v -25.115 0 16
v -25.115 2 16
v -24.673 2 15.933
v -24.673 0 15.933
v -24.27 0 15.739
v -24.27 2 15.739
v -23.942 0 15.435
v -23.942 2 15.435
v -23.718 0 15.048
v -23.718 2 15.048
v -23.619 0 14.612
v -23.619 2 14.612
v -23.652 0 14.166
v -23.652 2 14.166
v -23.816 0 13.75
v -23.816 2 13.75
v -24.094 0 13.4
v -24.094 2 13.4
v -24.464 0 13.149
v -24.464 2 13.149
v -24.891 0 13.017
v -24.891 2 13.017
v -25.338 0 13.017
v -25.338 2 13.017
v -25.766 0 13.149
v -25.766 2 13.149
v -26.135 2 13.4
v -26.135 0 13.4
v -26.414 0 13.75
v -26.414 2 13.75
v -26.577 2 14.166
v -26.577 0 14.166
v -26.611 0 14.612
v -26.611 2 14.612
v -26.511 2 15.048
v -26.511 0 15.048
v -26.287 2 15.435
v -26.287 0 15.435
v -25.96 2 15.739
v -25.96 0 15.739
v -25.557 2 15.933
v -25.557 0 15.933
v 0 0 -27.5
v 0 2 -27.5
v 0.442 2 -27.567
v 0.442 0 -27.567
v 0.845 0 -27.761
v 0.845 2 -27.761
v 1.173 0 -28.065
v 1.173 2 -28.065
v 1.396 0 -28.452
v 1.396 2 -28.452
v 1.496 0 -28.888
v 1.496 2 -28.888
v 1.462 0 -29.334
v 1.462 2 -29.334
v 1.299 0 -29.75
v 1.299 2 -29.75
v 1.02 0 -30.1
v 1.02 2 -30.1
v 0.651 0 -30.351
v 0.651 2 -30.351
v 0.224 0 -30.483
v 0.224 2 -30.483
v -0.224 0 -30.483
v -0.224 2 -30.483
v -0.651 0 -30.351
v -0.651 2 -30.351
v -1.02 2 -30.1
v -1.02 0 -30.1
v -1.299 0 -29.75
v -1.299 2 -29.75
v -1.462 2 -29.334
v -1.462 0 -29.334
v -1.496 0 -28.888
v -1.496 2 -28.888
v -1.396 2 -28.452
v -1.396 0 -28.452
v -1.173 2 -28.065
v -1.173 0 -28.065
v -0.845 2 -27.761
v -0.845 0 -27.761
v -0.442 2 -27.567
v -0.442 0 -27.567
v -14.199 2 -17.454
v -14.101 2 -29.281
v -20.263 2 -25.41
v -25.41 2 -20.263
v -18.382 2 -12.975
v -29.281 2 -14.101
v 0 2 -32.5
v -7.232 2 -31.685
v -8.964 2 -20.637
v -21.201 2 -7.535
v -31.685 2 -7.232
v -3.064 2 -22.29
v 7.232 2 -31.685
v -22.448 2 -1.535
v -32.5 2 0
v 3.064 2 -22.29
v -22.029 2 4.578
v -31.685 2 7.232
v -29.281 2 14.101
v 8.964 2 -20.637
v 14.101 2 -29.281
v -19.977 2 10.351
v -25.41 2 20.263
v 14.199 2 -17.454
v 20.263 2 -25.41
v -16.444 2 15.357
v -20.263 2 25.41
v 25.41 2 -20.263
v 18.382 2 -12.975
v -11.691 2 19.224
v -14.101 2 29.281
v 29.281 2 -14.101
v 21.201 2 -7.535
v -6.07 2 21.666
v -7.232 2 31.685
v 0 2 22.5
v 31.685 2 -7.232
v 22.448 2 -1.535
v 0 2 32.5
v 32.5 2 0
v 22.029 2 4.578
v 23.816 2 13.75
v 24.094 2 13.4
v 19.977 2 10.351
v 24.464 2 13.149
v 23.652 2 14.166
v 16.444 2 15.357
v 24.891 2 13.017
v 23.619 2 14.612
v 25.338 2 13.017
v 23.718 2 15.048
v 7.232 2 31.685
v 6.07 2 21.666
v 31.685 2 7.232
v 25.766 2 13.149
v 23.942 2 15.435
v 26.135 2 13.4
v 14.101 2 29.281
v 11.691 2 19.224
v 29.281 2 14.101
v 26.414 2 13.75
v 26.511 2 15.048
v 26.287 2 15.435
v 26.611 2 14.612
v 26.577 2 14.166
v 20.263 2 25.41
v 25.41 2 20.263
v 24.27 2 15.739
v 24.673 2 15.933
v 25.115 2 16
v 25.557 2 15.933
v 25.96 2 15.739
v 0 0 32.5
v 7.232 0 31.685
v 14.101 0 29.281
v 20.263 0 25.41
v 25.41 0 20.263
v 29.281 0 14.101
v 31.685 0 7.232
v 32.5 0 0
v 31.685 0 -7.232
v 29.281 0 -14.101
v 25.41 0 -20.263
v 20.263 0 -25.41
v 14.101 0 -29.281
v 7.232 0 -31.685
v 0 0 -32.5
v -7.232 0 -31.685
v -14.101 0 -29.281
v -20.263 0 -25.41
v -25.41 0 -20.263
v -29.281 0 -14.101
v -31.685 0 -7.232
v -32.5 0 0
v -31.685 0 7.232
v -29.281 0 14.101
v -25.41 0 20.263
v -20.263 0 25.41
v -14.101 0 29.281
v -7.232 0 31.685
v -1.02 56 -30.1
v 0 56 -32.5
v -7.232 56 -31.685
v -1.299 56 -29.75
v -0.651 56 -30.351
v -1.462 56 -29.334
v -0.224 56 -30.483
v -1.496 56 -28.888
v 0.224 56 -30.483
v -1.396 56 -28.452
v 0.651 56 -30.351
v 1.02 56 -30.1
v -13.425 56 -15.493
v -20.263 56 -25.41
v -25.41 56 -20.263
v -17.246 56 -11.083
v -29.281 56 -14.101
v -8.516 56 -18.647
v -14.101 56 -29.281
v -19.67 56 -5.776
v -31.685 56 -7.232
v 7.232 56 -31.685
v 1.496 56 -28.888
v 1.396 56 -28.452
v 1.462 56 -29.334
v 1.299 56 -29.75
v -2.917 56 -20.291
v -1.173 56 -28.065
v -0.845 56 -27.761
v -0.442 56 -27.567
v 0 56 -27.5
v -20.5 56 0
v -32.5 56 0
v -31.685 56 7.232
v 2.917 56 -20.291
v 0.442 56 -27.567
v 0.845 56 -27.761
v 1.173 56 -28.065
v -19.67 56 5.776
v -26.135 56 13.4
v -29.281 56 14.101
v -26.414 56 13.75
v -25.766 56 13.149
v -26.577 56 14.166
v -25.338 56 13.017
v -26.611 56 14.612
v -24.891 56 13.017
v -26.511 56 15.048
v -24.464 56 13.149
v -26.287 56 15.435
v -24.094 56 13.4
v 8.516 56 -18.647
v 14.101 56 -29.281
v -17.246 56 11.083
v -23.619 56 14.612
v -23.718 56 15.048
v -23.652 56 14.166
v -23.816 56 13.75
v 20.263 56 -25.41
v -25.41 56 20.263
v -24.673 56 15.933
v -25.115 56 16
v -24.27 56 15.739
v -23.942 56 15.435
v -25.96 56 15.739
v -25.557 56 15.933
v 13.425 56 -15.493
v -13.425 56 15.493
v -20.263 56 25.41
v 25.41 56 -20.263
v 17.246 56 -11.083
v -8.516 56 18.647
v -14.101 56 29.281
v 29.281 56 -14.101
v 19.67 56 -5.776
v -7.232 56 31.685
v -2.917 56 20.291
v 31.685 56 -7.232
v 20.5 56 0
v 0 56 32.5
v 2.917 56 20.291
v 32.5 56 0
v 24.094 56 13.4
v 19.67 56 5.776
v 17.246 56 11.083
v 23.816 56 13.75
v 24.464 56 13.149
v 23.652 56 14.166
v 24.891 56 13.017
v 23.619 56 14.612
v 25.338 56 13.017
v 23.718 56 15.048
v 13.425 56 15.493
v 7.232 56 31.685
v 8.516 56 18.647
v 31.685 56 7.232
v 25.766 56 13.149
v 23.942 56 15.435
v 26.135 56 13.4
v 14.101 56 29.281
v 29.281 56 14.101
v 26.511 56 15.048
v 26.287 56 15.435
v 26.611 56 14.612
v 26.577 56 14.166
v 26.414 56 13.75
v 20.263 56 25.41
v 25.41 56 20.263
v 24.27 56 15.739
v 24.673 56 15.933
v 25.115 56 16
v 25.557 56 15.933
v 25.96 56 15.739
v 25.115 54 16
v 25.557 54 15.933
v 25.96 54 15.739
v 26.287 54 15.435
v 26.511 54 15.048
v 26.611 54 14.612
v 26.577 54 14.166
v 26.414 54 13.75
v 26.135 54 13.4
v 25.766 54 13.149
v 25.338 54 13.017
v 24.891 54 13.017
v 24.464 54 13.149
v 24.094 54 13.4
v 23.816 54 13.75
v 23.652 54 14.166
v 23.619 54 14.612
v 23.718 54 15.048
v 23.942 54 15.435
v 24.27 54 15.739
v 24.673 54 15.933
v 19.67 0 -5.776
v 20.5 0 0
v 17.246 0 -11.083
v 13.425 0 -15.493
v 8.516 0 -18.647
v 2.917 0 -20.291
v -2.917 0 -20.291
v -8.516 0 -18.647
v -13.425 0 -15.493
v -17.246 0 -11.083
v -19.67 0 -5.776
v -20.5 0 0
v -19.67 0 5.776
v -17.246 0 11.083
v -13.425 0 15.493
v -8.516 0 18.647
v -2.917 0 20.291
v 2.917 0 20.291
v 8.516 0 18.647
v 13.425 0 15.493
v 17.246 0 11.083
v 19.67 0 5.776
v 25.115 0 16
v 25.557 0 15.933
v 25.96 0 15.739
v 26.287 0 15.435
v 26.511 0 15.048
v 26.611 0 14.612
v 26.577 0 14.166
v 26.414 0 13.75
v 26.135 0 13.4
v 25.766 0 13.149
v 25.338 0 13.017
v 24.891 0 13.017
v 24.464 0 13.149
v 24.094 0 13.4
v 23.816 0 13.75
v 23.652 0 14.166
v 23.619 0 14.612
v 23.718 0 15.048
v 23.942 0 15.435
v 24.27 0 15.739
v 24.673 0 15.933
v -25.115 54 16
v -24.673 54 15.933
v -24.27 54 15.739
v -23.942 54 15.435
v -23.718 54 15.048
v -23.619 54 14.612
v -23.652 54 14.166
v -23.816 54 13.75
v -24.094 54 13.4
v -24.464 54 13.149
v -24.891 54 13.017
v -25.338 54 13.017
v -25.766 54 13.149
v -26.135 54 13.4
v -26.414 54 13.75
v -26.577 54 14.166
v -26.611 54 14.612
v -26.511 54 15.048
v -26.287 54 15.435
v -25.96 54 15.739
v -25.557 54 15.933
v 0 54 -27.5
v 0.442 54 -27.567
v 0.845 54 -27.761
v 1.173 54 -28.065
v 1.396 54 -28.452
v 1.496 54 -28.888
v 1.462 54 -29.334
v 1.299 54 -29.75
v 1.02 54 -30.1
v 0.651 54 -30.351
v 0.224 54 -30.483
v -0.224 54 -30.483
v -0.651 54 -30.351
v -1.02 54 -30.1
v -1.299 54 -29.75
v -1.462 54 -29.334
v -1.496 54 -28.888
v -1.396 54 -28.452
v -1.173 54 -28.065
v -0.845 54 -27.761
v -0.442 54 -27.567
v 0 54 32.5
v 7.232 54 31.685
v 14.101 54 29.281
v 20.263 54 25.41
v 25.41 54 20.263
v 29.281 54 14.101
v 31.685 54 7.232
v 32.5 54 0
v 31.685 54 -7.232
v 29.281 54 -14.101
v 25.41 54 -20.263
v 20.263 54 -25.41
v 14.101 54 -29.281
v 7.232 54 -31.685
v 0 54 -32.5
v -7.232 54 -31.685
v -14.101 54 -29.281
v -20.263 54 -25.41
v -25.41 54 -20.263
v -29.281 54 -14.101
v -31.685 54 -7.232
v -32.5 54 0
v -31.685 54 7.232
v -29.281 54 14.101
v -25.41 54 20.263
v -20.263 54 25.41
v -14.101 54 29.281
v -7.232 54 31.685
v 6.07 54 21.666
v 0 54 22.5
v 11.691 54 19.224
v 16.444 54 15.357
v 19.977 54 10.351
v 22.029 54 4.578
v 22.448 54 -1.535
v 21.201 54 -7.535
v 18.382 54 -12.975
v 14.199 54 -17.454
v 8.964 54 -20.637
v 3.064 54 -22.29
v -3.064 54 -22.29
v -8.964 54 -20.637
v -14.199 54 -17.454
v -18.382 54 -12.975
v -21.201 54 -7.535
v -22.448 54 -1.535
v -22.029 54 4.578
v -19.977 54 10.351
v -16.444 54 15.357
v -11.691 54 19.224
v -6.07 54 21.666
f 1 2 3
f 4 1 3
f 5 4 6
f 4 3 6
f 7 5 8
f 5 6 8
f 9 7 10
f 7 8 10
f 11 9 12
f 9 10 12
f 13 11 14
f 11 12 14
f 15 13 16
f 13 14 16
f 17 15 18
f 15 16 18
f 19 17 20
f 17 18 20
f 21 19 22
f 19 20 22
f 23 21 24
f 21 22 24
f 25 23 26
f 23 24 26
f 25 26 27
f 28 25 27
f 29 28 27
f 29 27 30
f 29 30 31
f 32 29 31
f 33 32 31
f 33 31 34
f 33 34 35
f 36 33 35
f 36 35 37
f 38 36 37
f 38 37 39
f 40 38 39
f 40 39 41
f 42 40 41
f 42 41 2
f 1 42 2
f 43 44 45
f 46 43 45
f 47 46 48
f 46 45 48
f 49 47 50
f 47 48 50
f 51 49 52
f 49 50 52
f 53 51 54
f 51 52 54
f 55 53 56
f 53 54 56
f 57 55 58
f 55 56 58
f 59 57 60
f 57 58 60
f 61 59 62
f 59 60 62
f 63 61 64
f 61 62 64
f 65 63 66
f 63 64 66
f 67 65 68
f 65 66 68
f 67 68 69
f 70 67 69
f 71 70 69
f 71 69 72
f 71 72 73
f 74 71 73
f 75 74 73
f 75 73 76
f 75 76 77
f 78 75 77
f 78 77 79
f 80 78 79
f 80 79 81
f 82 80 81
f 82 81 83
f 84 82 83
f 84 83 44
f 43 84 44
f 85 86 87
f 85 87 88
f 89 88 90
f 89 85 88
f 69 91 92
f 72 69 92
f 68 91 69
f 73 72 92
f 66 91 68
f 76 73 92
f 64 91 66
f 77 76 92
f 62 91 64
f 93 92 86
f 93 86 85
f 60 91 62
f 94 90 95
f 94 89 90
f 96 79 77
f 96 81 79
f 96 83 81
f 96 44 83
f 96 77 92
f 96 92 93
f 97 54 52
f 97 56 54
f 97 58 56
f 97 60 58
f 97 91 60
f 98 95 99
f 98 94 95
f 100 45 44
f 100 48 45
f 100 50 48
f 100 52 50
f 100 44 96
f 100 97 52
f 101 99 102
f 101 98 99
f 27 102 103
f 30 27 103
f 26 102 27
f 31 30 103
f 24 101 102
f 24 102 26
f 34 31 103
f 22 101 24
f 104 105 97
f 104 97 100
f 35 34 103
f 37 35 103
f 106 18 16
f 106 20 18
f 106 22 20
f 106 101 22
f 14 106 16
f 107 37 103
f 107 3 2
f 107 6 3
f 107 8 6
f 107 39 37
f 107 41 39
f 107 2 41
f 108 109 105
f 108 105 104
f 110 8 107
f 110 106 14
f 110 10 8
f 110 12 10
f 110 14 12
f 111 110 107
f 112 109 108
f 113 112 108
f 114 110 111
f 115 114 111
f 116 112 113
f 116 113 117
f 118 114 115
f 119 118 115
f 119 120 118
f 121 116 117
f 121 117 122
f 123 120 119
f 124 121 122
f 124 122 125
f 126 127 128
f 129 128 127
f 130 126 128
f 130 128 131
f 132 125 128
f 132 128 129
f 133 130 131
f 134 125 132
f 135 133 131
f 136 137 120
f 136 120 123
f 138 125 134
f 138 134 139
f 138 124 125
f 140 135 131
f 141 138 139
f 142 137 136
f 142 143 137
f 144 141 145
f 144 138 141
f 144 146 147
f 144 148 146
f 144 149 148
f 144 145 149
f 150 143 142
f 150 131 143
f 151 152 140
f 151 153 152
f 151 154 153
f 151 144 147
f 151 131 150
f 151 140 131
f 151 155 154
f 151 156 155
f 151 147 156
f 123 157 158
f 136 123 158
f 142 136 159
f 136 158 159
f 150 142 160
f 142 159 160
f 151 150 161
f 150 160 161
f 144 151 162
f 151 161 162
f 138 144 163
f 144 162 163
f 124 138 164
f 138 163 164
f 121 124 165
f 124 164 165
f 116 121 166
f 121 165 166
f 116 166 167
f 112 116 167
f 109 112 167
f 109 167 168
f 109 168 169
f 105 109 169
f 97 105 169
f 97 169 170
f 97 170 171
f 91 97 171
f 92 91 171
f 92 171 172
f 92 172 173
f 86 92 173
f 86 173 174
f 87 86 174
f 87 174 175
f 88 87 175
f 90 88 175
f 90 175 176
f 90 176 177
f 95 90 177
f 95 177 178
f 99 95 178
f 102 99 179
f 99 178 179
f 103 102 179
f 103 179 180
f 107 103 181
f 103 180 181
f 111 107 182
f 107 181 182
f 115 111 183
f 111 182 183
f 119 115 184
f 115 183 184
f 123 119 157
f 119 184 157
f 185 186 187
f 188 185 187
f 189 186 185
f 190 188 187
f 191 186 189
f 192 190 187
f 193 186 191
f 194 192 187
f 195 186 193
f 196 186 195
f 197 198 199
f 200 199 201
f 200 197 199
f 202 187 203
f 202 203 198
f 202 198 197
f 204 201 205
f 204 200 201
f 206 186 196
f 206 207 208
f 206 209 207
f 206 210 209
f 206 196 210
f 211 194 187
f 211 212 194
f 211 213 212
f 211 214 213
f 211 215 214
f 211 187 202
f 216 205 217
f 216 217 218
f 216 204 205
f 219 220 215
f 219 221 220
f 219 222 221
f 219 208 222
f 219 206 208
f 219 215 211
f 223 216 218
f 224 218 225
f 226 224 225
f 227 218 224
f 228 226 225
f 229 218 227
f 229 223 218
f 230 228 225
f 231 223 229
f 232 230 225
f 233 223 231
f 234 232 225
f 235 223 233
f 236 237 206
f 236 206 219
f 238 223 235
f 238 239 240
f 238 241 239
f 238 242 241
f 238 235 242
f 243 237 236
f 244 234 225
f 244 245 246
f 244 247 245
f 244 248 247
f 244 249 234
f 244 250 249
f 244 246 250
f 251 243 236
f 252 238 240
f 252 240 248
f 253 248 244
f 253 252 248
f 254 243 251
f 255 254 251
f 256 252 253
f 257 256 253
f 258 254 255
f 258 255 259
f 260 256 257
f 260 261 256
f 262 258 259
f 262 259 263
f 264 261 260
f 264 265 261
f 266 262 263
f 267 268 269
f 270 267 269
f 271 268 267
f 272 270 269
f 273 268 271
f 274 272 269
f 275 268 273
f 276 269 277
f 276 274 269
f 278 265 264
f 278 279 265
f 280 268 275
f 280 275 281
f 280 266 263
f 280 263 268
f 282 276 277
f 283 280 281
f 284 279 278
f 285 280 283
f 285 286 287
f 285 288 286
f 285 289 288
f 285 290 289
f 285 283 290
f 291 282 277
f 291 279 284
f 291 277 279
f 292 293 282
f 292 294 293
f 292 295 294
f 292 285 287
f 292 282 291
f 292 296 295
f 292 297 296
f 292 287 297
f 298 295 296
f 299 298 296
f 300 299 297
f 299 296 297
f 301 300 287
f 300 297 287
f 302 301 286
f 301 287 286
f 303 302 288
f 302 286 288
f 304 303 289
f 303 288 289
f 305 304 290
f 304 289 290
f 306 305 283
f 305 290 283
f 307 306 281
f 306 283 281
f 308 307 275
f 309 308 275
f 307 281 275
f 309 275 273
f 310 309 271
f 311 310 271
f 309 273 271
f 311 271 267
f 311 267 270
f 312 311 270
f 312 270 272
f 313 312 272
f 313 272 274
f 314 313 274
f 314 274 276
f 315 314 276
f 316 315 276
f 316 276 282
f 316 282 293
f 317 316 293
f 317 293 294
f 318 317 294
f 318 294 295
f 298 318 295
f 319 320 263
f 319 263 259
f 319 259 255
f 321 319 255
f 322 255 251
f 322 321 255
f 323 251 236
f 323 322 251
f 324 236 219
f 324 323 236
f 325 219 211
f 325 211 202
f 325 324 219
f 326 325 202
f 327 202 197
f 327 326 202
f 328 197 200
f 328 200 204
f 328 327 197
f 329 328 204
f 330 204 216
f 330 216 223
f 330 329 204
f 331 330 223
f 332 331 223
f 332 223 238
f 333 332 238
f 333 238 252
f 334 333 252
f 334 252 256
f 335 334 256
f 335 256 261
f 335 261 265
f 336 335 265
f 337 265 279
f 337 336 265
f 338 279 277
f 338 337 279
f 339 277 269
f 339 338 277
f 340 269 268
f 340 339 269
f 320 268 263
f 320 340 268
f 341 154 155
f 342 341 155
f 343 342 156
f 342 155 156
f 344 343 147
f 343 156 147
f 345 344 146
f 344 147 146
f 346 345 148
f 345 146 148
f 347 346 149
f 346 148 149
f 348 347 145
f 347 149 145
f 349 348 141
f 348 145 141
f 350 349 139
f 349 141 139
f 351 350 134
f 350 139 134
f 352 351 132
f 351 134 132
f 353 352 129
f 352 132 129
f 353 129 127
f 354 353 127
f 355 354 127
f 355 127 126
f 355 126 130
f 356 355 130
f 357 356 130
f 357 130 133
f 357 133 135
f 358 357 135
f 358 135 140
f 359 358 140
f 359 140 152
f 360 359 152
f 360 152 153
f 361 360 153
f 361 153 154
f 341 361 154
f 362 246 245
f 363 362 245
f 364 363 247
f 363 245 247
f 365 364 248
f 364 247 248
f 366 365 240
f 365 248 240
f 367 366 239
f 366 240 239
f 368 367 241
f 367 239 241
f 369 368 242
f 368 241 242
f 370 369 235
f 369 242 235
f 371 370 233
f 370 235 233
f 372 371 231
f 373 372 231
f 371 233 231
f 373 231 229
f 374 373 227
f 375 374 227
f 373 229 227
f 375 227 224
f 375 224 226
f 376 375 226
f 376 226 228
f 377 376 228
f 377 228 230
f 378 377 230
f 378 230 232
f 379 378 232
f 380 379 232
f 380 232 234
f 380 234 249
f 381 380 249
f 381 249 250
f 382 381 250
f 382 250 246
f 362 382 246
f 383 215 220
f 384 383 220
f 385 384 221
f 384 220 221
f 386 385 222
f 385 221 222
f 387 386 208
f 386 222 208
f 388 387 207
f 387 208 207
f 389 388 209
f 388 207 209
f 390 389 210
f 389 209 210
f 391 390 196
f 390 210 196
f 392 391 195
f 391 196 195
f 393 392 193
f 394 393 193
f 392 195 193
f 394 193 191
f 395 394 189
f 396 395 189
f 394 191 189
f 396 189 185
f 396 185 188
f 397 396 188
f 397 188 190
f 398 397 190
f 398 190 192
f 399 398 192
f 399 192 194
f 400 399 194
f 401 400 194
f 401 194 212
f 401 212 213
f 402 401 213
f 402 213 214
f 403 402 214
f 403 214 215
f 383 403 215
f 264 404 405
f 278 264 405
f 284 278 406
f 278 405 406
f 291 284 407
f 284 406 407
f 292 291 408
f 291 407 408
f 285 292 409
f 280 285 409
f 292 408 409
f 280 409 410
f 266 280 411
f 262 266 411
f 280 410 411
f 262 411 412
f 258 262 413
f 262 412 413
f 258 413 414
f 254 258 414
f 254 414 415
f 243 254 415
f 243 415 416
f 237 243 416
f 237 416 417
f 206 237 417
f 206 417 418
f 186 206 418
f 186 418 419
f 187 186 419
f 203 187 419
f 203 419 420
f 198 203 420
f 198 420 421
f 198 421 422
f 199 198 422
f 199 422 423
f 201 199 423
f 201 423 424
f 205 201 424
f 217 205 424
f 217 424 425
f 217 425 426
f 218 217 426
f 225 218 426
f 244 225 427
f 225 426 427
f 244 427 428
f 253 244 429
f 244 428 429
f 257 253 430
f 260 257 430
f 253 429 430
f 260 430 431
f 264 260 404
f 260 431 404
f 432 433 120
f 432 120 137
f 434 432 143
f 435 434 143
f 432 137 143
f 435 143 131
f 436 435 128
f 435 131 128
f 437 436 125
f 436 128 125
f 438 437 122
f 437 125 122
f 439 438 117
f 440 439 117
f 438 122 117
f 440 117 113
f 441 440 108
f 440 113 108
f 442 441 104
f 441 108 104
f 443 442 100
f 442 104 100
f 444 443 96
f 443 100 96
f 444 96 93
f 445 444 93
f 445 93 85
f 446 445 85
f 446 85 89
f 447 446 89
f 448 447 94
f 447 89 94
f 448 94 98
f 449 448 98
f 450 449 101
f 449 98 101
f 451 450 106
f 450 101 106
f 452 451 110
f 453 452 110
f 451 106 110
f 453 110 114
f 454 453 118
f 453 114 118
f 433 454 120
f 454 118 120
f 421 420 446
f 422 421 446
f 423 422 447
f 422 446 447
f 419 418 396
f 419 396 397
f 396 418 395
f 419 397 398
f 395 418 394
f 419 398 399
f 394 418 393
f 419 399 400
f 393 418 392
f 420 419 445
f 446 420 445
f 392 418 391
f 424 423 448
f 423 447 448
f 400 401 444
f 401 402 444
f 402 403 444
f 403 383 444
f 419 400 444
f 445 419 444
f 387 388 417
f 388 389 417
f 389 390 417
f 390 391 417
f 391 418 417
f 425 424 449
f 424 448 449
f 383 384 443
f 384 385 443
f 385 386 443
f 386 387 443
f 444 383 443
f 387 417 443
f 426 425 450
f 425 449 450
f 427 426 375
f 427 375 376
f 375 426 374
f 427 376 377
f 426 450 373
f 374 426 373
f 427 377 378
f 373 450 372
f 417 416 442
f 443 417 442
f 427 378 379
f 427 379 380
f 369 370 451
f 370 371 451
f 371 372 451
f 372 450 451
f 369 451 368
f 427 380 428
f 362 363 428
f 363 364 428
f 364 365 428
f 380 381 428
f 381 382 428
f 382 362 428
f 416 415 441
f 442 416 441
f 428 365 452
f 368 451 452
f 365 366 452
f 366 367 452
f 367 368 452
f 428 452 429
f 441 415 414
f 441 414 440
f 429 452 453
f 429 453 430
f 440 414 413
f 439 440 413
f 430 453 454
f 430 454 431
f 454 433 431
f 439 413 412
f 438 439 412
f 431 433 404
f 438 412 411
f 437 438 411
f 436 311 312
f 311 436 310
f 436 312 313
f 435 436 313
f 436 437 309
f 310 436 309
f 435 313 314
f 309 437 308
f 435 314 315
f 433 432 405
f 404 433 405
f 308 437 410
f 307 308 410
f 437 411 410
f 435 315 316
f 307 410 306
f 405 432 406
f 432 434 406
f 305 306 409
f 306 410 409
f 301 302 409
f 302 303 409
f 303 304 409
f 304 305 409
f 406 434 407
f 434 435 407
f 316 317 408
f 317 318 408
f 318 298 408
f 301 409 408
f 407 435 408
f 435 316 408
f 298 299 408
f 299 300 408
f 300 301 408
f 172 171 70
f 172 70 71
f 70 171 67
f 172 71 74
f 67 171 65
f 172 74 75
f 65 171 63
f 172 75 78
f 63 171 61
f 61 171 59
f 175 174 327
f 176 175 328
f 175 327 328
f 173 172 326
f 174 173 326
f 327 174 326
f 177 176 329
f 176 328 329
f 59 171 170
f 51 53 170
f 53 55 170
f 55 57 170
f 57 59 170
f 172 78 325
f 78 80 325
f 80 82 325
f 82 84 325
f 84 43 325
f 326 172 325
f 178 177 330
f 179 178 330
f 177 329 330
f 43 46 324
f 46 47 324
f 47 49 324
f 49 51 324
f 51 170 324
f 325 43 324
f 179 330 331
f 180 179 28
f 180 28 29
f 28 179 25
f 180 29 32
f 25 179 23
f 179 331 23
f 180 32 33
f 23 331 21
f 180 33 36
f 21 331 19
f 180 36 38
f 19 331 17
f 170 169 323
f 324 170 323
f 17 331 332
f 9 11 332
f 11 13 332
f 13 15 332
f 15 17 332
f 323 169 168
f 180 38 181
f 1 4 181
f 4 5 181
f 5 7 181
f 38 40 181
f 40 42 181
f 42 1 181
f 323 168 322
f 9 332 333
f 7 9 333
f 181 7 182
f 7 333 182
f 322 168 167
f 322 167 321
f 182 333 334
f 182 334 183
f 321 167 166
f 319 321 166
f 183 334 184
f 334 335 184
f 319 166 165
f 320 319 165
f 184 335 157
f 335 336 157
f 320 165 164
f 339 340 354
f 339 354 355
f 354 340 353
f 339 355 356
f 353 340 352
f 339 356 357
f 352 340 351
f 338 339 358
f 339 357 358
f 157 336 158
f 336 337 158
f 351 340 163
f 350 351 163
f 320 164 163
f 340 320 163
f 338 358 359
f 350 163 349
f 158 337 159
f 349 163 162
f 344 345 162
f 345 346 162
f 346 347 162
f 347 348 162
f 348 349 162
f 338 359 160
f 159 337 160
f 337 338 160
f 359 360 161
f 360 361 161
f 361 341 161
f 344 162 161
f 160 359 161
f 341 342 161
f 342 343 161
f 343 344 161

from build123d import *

# Parameters (mm, degrees)
SKETCH1_R           = 32.5
BOSS_EXTRUDE1_DEPTH = 56
CUT_EXTRUDE4_START  = -54
SKETCH6_R           = 32.5
SKETCH6_R_2         = 22.5
CUT_EXTRUDE4_DEPTH  = 52
SKETCH2_R           = 1.5
CUT_EXTRUDE2_DEPTH  = 73.446532008
SHELL1_OUTLINE_R    = 20.5
SHELL1_DEPTH        = 56


# Read off the part's stored shape, not the designer's step: Shell1
with BuildPart() as part:
    # Sketch1 → Boss-Extrude1 (new body)
    with BuildSketch(Plane(origin=(0, 0, 0), x_dir=(1, 0, 0), z_dir=(0, 1, 0))):
        with Locations(Location((0, 0, 0), (0, 0, 270))):
            Circle(SKETCH1_R)
    extrude(amount=BOSS_EXTRUDE1_DEPTH)

    # Sketch6 → Cut-Extrude4 (cut)
    with BuildSketch(Plane(origin=(0, 56, 0), x_dir=(1, 0, 0), z_dir=(0, 1, 0)).offset(CUT_EXTRUDE4_START)):
        with Locations(Location((0, 0, 0), (0, 0, 270))):
            Circle(SKETCH6_R)
        with Locations(Location((0, 0, 0), (0, 0, 270))):
            Circle(SKETCH6_R_2, mode=Mode.SUBTRACT)
    extrude(amount=CUT_EXTRUDE4_DEPTH, mode=Mode.SUBTRACT)

    # Sketch2 → Cut-Extrude2 (cut, through all)
    with BuildSketch(Plane(origin=(0, 56, 0), x_dir=(1, 0, 0), z_dir=(0, 1, 0))):
        with Locations(Location((0, 29, 0), (0, 0, 270))):
            Circle(SKETCH2_R)
        with Locations(Location((-25.11473671, -14.5, 0), (0, 0, 270))):
            Circle(SKETCH2_R)
        with Locations(Location((25.11473671, -14.5, 0), (0, 0, 270))):
            Circle(SKETCH2_R)
    extrude(amount=-CUT_EXTRUDE2_DEPTH, mode=Mode.SUBTRACT)

    # Shell1 outline → Shell1 (cut)
    with BuildSketch(Plane(origin=(0, 0, 0), x_dir=(1, 0, 0), z_dir=(0, 1, 0))):
        Circle(SHELL1_OUTLINE_R)
    extrude(amount=SHELL1_DEPTH, mode=Mode.SUBTRACT)


solid = part.part
